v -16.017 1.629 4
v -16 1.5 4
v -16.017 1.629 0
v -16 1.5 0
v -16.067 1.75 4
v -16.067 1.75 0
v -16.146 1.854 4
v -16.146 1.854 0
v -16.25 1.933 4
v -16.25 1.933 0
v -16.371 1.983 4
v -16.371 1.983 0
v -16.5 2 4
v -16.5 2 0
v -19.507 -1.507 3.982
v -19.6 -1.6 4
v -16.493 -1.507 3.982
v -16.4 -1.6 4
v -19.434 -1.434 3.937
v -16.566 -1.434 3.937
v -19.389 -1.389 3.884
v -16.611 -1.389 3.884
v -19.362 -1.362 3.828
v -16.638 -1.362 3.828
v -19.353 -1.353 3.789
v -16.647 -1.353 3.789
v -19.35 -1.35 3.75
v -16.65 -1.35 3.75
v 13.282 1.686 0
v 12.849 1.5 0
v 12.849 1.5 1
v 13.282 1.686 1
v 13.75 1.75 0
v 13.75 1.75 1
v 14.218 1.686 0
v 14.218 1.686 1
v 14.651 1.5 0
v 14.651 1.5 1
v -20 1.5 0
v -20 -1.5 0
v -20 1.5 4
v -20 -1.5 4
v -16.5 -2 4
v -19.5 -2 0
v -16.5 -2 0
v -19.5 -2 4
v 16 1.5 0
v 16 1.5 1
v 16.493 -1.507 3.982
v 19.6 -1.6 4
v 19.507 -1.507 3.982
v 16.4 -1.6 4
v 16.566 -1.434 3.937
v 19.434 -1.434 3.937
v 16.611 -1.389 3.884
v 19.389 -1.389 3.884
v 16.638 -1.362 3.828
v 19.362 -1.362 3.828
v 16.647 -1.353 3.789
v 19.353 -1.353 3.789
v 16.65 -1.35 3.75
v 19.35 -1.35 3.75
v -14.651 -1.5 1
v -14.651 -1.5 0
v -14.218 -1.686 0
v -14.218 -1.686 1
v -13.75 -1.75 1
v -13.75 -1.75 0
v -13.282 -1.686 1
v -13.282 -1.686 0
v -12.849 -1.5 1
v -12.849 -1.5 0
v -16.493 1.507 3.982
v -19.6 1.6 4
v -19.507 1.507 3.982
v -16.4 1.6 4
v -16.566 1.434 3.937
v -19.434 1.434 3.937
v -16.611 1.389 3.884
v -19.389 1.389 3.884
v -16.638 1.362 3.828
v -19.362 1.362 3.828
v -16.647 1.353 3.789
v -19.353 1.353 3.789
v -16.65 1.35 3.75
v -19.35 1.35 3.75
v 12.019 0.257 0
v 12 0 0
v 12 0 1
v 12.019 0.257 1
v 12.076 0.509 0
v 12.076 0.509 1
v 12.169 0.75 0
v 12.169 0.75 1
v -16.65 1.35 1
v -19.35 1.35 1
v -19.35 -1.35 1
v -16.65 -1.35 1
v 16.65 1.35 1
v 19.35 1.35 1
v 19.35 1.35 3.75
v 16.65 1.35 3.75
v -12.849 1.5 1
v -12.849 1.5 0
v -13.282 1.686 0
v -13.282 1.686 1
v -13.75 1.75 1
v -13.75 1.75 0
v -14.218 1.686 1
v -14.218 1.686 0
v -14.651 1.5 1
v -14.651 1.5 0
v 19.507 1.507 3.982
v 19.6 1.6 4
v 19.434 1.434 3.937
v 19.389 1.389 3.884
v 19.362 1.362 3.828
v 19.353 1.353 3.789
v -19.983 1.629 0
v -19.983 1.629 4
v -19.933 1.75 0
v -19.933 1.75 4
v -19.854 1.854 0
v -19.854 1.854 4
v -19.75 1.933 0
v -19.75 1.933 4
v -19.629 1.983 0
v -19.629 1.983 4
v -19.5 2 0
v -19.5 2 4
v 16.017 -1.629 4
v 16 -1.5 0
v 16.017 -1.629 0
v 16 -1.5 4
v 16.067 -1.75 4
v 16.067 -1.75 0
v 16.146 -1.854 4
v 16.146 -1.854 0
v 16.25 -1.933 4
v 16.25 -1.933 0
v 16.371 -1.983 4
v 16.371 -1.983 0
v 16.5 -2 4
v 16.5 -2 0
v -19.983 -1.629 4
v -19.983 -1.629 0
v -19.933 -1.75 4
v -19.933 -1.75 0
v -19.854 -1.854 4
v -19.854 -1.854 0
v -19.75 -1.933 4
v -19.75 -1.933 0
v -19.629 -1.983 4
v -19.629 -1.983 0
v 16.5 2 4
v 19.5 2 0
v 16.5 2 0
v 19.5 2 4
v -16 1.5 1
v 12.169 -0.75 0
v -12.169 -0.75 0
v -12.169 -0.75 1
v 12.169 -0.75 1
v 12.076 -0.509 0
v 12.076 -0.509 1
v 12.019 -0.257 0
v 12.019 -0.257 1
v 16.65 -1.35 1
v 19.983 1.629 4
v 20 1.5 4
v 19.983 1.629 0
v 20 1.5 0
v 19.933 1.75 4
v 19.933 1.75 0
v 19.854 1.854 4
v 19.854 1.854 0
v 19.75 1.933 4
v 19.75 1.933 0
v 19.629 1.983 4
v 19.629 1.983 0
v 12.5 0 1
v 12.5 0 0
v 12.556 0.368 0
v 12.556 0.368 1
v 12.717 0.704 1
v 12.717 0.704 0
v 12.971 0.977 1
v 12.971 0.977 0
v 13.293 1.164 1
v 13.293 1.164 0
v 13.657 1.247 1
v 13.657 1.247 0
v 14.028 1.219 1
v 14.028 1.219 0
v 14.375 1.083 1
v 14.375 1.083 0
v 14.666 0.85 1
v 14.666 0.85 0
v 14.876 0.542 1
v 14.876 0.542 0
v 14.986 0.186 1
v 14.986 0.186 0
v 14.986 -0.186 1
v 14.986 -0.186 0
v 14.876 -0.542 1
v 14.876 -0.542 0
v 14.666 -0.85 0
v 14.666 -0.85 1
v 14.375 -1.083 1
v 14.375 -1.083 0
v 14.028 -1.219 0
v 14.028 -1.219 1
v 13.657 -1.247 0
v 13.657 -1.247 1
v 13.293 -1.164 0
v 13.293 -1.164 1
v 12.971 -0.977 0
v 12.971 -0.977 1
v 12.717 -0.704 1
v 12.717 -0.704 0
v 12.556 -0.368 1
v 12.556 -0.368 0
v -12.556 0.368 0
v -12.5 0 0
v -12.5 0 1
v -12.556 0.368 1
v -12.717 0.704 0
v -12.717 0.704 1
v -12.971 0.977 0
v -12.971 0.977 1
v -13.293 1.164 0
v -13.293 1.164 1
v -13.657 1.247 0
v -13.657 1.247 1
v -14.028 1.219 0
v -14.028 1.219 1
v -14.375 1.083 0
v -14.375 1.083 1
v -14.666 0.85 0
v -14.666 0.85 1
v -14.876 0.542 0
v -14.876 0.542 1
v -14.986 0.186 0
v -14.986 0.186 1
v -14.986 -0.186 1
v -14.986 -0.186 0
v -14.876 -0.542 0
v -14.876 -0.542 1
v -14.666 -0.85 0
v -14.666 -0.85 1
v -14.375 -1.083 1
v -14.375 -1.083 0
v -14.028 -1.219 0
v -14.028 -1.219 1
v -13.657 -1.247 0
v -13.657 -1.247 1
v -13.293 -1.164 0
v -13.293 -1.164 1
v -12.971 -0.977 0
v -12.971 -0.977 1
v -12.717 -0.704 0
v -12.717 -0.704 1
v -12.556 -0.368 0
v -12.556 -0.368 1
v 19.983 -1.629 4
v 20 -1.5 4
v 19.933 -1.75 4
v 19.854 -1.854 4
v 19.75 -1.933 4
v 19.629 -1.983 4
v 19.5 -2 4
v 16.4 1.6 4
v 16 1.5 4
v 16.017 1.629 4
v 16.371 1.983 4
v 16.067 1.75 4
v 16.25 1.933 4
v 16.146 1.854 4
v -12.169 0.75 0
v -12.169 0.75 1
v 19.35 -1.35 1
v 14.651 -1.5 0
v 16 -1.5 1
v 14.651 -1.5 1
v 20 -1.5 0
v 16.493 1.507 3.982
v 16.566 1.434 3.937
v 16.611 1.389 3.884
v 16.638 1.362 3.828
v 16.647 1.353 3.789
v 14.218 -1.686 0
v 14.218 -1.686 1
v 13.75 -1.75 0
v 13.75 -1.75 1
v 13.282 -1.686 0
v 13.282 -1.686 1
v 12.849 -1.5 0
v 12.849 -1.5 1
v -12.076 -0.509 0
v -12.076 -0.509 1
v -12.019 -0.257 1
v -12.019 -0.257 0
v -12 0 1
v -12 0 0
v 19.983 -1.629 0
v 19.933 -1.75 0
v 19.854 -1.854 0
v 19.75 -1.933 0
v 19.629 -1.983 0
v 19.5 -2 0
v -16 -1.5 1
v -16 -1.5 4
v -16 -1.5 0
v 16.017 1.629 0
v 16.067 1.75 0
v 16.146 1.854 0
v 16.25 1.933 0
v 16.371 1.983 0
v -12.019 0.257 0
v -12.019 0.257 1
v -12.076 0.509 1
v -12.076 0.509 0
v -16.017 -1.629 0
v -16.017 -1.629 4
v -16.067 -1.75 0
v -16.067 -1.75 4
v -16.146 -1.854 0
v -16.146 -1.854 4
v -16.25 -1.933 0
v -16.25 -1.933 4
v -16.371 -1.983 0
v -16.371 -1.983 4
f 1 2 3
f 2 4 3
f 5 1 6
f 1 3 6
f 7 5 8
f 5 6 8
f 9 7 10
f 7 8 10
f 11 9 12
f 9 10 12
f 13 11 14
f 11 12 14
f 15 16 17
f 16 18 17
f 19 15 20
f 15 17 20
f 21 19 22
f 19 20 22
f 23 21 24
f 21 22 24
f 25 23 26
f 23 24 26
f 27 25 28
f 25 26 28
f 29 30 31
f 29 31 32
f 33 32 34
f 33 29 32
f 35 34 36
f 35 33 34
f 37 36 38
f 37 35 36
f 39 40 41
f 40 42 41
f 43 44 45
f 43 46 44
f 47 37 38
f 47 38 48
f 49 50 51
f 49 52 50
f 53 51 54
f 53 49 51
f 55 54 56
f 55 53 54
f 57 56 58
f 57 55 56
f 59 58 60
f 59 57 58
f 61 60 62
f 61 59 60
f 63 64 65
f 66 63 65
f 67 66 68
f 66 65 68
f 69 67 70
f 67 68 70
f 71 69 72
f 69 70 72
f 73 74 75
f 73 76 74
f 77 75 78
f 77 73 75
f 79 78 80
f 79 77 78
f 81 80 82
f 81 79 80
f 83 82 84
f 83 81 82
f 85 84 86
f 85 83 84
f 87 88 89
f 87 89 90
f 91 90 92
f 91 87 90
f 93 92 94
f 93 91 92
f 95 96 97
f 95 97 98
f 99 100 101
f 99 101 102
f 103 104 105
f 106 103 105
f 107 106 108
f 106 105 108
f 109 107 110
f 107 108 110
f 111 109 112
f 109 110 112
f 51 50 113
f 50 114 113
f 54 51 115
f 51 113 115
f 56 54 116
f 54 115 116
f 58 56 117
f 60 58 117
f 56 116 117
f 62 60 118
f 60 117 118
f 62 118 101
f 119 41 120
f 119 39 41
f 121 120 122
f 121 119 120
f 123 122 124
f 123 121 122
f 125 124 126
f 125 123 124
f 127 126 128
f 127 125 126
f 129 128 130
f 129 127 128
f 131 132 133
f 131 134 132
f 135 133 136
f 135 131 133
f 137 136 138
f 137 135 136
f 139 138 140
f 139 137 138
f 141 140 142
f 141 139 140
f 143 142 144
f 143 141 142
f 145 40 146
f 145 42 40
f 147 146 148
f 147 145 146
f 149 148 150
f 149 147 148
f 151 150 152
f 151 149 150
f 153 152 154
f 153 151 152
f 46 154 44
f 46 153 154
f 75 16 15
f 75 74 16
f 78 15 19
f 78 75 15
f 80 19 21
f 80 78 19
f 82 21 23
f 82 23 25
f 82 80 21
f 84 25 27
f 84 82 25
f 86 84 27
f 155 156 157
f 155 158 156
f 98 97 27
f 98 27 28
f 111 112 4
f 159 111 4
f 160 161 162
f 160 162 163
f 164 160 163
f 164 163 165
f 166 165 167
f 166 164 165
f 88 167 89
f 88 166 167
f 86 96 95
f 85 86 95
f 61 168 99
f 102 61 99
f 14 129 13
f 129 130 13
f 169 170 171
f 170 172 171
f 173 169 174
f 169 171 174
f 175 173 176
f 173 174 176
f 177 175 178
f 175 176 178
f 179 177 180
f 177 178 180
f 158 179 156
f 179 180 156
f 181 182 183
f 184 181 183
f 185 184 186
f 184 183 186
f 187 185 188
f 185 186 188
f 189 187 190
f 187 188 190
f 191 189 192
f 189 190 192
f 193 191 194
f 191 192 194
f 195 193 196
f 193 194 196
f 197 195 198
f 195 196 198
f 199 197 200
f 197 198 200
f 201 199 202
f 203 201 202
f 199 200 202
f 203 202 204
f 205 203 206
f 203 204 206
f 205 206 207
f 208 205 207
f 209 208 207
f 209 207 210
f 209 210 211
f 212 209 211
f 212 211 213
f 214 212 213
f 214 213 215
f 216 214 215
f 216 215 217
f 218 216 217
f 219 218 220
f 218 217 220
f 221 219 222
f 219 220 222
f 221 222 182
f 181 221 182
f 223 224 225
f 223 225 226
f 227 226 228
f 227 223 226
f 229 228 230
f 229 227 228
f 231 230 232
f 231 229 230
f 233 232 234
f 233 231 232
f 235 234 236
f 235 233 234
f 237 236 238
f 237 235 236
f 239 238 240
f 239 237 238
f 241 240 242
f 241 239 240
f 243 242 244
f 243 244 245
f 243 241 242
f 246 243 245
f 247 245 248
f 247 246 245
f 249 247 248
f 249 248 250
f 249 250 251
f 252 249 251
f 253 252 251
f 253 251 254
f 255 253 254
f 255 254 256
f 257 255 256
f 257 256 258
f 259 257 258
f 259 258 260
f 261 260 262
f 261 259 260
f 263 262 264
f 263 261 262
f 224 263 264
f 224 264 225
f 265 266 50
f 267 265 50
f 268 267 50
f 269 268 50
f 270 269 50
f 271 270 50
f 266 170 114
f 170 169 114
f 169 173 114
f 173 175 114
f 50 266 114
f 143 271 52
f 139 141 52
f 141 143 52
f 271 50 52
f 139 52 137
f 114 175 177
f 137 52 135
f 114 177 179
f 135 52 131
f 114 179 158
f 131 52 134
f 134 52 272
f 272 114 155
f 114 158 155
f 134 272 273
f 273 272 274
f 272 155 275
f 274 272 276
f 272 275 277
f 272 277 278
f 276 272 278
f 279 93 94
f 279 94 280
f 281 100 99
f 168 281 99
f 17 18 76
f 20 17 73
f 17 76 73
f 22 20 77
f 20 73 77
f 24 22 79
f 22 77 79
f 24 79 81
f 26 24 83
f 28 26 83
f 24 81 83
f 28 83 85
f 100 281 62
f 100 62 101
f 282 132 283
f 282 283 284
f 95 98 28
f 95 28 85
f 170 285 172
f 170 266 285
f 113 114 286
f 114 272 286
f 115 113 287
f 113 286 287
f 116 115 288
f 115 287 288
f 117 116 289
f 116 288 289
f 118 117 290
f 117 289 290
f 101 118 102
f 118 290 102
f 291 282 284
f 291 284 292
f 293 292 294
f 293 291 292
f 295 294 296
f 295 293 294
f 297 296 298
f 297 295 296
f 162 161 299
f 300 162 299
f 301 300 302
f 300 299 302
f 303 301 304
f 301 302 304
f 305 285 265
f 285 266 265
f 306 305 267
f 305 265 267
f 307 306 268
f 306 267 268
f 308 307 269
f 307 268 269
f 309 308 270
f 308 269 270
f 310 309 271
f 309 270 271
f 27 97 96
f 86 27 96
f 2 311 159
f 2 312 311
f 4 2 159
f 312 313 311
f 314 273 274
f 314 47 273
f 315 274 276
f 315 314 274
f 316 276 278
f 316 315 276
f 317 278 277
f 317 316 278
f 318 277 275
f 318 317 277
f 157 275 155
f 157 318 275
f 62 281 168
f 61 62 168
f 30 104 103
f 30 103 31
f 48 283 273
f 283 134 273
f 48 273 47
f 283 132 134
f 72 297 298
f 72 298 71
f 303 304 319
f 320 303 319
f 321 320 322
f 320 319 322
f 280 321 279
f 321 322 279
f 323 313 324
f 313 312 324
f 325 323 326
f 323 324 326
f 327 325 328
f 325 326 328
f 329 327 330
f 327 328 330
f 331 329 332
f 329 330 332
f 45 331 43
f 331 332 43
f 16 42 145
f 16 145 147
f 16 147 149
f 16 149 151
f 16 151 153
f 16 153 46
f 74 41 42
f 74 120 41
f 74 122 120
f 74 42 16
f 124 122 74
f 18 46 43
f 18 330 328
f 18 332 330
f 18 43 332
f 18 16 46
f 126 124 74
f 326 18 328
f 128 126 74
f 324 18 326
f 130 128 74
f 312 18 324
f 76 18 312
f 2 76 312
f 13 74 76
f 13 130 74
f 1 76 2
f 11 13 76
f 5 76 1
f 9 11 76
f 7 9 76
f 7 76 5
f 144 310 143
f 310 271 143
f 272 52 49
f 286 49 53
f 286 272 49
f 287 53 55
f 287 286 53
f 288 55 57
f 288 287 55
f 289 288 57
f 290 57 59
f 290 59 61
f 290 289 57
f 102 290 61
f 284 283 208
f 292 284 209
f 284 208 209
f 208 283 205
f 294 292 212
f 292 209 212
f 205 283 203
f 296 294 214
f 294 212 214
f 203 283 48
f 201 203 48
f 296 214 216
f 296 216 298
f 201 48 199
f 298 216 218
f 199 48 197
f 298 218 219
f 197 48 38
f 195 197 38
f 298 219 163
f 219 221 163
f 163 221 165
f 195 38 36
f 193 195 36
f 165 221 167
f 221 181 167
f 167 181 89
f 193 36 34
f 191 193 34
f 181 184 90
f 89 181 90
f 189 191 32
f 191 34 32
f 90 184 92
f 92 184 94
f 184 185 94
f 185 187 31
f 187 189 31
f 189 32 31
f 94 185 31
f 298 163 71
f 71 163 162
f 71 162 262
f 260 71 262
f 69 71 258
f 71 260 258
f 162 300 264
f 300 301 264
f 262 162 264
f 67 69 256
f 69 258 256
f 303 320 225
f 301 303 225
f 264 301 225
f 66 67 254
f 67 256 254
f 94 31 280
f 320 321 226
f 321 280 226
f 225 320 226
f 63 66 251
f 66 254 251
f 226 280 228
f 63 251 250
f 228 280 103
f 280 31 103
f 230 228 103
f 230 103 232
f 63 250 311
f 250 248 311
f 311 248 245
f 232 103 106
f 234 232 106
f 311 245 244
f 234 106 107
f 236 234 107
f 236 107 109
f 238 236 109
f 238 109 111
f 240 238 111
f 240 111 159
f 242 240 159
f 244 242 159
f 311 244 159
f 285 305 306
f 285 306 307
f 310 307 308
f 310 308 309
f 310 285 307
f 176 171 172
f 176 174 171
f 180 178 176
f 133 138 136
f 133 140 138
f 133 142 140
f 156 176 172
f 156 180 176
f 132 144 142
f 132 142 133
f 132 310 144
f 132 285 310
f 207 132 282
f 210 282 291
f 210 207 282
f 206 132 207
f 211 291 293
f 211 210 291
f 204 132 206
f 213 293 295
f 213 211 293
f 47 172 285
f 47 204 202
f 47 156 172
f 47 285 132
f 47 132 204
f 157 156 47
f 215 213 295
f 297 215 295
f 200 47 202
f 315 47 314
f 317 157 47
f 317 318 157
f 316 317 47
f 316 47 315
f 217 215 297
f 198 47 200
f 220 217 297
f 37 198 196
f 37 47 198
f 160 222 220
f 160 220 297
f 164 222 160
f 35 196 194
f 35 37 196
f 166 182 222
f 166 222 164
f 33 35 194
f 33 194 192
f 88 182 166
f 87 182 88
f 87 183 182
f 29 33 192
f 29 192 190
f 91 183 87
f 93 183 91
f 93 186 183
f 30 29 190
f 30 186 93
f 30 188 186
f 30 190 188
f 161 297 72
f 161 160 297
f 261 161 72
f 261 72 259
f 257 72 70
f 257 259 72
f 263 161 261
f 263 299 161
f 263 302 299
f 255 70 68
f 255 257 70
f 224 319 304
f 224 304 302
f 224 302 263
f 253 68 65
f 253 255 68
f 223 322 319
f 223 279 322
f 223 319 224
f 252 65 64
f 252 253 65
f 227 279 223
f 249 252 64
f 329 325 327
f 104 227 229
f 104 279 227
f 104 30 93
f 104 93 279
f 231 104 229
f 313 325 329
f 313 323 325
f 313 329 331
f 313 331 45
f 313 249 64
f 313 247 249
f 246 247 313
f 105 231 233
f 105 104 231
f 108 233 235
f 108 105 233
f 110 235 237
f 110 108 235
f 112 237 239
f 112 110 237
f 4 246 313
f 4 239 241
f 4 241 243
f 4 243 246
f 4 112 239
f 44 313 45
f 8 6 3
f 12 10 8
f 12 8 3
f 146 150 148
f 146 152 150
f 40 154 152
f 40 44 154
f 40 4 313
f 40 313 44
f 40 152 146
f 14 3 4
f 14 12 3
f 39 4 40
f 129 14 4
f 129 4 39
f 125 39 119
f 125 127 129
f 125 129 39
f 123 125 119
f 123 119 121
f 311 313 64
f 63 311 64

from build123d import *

# Parameters (mm, degrees)
F0_R          = 1.25
F1_DEPTH      = 1
F2_W          = 4
F2_H          = 4
F2_W_2        = 2.7
F2_H_2        = 2.7
F3_DEPTH      = 3
F3_DEPTH_BACK = 1
F4_R          = 0.49999
F5_R          = 0.25


# Not quite as in the source:
# - a fillet or chamfer is up to 0.001 mm smaller than in the source, because OpenCascade refuses the exact size


with BuildPart() as f1:
    # F0 (on Top) → F1 (new body)
    with BuildSketch(Plane.XY):
        with BuildLine():
            Line((0, 0.75), (0, 1.5))
            Line((0, 1.5), (-12.8486121811, 1.5))
            ThreePointArc((-12.8486121811, 1.5), (-12.4533274736, 1.1752192814), (-12.1688611699, 0.75))
            Line((-12.1688611699, 0.75), (0, 0.75))
        make_face()
        with BuildLine():
            ThreePointArc((-12.1688611699, 0.75), (-12.4533274736, 1.1752192814), (-12.8486121811, 1.5))
            Line((-12.8486121811, 1.5), (-14.6513878189, 1.5))
            ThreePointArc((-14.6513878189, 1.5), (-15.5, 0), (-14.6513878189, -1.5))
            Line((-14.6513878189, -1.5), (-12.8486121811, -1.5))
            ThreePointArc((-12.8486121811, -1.5), (-12.4533274736, -1.1752192814), (-12.1688611699, -0.75))
            ThreePointArc((-12.1688611699, -0.75), (-12.0427371391, -0.3843872054), (-12, 0))
            ThreePointArc((-12, 0), (-12.0427371391, 0.3843872054), (-12.1688611699, 0.75))
        make_face()
        with Locations((-13.75, 0)):
            Circle(F0_R, mode=Mode.SUBTRACT)
        with BuildLine():
            Line((-14.6513878189, 1.5), (-12.8486121811, 1.5))
            ThreePointArc((-12.8486121811, 1.5), (-13.75, 1.75), (-14.6513878189, 1.5))
        make_face()
        with BuildLine():
            ThreePointArc((-14.6513878189, -1.5), (-15.5, 0), (-14.6513878189, 1.5))
            Line((-14.6513878189, 1.5), (-19.5, 1.5))
            Line((-19.5, 1.5), (-19.5, -1.5))
            Line((-19.5, -1.5), (-14.6513878189, -1.5))
        make_face()
        with BuildLine():
            Line((-12.8486121811, -1.5), (-14.6513878189, -1.5))
            ThreePointArc((-14.6513878189, -1.5), (-13.75, -1.75), (-12.8486121811, -1.5))
        make_face()
        with BuildLine():
            ThreePointArc((-12.1688611699, -0.75), (-12.4533274736, -1.1752192814), (-12.8486121811, -1.5))
            Line((-12.8486121811, -1.5), (0, -1.5))
            Line((0, -1.5), (0, -0.75))
            Line((0, -0.75), (-12.1688611699, -0.75))
        make_face()
    extrude(amount=F1_DEPTH)

    # F2 (on face) → F3 (join, two sides)
    with BuildSketch(Plane.XY.offset(1)) as f3_sk:
        with Locations((-18, 0)):
            Rectangle(F2_W, F2_H)
        with Locations((-18, 0)):
            Rectangle(F2_W_2, F2_H_2, mode=Mode.SUBTRACT)
    extrude(amount=F3_DEPTH)
    extrude(f3_sk.sketch, amount=-F3_DEPTH_BACK)

    # F4 (radius 0.5 in the source; OpenCascade refuses exactly that, so slightly less here)
    f4_edges = [f1.edges().sort_by_distance(p)[0] for p in [
        (-16, -2, 2),
        (-20, -2, 2),
        (-16, 2, 2),
        (-20, 2, 2),
    ]]
    fillet(f4_edges, radius=F4_R)

    # F5
    f5_edges = [f1.edges().sort_by_distance(p)[0] for p in [
        (-18, -1.35, 4),
        (-16.65, 0, 4),
        (-18, 1.35, 4),
        (-19.35, 0, 4),
    ]]
    fillet(f5_edges, radius=F5_R)

    # F6: F1 across plane


with BuildPart() as f1_1:
    add(f1.part)
    add(f1.part.mirror(Plane.YZ))


solid = f1_1.part
